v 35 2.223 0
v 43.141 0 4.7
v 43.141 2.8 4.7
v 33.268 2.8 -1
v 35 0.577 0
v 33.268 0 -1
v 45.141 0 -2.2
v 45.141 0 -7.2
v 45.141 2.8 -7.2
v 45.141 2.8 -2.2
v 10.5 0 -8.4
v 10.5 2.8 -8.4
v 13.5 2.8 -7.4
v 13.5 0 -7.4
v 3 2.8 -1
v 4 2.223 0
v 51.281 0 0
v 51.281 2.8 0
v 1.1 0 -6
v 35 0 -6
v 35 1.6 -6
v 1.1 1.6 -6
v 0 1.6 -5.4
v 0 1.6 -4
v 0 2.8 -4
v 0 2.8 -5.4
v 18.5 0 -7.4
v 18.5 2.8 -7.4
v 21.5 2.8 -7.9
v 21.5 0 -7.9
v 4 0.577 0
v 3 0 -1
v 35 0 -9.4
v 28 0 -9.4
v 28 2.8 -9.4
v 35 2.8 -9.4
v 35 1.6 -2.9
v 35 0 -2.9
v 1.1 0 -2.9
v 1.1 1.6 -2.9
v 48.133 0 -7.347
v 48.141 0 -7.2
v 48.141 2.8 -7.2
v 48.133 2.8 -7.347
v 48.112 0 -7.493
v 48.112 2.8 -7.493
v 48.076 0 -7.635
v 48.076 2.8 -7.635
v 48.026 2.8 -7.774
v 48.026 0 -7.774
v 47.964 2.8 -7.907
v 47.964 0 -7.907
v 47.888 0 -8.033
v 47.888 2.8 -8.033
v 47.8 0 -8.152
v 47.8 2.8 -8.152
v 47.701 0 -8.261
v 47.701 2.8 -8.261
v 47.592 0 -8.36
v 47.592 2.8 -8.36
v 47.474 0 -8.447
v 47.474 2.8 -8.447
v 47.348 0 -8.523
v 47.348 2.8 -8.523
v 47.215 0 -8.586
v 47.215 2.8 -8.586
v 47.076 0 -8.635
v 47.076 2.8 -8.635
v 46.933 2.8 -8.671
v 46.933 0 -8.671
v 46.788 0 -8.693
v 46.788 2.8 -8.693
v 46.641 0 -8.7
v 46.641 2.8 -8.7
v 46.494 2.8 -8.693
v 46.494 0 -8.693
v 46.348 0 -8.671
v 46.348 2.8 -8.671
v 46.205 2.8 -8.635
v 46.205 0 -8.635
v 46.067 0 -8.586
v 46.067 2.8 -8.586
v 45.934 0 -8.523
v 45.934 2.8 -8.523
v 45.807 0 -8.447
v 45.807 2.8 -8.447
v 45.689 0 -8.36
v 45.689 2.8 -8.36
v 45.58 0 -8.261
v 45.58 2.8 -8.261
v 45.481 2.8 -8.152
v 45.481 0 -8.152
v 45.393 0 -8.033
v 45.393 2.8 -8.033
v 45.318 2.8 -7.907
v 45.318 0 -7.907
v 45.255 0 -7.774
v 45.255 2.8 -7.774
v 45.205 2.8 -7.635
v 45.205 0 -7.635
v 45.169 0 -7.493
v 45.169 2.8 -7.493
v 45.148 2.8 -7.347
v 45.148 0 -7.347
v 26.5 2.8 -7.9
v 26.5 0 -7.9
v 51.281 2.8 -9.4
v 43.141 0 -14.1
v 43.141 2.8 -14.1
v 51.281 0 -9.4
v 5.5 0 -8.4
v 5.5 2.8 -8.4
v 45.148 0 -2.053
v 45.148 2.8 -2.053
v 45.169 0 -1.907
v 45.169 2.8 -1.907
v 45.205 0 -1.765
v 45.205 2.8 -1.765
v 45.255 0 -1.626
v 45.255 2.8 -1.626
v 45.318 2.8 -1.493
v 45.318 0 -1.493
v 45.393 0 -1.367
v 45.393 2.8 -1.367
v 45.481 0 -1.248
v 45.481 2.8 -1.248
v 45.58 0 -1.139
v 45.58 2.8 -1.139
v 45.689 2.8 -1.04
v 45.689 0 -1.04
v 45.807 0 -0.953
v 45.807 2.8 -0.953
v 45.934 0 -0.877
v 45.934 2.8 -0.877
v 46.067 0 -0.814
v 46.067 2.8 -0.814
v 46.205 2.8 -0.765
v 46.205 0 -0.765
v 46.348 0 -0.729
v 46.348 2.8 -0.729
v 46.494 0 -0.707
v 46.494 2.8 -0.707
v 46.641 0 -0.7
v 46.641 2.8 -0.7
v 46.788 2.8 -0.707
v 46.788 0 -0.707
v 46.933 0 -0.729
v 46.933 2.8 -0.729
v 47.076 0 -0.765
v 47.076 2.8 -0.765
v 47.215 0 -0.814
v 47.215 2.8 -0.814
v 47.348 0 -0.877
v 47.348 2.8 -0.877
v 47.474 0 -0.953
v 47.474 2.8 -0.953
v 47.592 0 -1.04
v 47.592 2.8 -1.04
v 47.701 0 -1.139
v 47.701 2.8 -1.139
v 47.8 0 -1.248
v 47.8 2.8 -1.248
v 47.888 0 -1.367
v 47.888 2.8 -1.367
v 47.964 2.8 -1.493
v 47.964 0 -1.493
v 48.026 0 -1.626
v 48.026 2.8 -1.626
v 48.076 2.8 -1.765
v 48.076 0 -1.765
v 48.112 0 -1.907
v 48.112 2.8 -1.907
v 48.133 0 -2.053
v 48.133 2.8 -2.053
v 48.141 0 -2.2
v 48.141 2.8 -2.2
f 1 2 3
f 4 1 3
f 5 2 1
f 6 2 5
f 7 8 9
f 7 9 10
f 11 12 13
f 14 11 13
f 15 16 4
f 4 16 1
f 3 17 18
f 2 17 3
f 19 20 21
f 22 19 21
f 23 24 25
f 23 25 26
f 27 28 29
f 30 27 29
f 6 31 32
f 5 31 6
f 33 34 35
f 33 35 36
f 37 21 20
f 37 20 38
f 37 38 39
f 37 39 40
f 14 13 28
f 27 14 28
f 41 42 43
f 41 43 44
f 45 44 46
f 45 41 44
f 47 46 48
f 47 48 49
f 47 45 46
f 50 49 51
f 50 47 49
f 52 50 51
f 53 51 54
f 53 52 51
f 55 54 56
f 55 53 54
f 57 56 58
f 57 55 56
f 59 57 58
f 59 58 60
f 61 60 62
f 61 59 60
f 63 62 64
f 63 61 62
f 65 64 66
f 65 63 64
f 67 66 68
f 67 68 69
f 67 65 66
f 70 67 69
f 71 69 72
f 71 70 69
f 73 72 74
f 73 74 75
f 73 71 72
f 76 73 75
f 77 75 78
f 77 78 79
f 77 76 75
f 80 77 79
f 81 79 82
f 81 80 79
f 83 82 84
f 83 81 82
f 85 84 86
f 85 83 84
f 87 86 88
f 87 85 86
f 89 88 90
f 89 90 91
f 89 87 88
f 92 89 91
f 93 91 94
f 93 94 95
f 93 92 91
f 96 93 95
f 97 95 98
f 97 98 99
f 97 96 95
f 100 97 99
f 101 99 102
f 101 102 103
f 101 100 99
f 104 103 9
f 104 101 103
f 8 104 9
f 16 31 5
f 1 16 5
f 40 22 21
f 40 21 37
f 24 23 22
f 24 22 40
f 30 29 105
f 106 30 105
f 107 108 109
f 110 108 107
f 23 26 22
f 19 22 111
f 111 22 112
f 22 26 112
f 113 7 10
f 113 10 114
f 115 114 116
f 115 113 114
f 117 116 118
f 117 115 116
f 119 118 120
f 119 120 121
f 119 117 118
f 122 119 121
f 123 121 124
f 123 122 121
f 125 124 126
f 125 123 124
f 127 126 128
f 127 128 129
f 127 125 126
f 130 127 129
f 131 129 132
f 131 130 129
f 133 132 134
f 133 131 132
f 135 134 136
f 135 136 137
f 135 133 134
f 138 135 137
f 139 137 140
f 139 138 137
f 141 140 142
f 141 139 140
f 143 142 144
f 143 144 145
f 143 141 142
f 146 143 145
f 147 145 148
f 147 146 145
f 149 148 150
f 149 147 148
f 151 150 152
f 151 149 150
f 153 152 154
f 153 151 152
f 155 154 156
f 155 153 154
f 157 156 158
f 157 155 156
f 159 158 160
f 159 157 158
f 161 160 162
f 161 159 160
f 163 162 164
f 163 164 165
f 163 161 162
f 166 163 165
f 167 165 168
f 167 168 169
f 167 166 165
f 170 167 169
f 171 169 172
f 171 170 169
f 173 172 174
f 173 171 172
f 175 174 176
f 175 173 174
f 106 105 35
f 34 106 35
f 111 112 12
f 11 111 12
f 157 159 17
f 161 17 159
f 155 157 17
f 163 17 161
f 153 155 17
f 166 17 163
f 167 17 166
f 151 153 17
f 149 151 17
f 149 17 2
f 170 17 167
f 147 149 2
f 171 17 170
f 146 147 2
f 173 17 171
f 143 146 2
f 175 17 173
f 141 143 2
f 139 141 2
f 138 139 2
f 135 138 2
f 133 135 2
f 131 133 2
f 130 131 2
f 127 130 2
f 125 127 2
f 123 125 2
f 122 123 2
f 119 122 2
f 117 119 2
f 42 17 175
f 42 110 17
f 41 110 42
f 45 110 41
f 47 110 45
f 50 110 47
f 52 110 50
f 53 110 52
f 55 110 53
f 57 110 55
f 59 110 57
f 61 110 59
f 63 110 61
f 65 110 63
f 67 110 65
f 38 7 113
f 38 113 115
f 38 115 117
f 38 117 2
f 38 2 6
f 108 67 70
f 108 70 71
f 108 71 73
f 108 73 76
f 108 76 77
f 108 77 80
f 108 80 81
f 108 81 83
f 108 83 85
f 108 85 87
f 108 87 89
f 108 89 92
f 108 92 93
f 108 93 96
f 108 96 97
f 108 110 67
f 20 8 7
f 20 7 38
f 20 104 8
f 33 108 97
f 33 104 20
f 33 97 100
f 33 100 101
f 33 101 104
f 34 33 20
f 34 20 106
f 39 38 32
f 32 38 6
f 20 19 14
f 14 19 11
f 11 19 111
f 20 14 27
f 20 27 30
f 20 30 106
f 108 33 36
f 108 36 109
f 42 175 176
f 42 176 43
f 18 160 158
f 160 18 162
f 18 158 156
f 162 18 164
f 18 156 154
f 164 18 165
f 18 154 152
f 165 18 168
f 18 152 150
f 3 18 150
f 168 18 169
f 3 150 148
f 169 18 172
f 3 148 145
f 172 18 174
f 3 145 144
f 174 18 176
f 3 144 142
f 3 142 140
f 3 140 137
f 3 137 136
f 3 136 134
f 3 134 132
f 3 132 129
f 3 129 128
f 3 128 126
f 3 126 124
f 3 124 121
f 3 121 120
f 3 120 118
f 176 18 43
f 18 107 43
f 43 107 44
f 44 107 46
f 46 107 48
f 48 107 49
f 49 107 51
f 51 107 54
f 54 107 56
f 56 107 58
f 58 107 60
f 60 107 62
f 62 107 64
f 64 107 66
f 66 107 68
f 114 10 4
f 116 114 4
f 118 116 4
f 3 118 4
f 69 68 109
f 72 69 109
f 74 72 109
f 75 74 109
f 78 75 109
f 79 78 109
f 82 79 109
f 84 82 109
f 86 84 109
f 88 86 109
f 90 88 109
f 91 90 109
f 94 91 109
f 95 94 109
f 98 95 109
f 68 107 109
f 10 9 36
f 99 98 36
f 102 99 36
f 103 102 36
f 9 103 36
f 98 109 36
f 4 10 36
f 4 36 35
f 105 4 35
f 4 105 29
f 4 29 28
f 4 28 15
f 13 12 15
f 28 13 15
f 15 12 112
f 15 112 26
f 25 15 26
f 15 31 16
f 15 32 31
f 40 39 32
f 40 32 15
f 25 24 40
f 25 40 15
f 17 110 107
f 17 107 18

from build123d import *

# Parameters (mm, degrees)
SKETCH1_W           = 35
SKETCH1_H           = 9.4
BOSS_EXTRUDE1_DEPTH = 2.8
SKETCH2_W           = 3.1
SKETCH2_H           = 1.6
CUT_EXTRUDE1_DEPTH  = 35
CHAMFER2_SIZE       = 4
CHAMFER5_SIZE       = 1
CHAMFER5_SIZE2      = 0.577350269
CHAMFER6_SIZE       = 1
CHAMFER6_SIZE2      = 0.577350269
CUT_EXTRUDE2_DEPTH  = 10


with BuildPart() as part:
    # Sketch1 → Boss-Extrude1 (new body)
    # profile 1 of 2: a face of its own
    with BuildSketch(Plane(origin=(0, 0, 0), x_dir=(1, 0, 0), z_dir=(0, 1, 0))):
        with Locations((17.5, 4.7)):
            Rectangle(SKETCH1_W, SKETCH1_H)
    # profile 2 of 2: a face of its own
    with BuildSketch(Plane(origin=(0, 0, 0), x_dir=(1, 0, 0), z_dir=(0, 1, 0))):
        Polygon((35, 0), (35, 9.4), (43.140638796, 14.1), (51.281277591, 9.4), (51.281277591, 0), (43.140638796, -4.7), align=None)
        with BuildLine():
            ThreePointArc((45.140638796, 2.2), (46.640638796, 0.7), (48.140638796, 2.2))
            Line((48.140638796, 2.2), (48.140638796, 7.2))
            ThreePointArc((48.140638796, 7.2), (46.640638796, 8.7), (45.140638796, 7.2))
            Line((45.140638796, 7.2), (45.140638796, 2.2))
        make_face(mode=Mode.SUBTRACT)
    extrude(amount=BOSS_EXTRUDE1_DEPTH)

    # Sketch2 → Cut-Extrude1 (cut)
    with BuildSketch(Plane.ZY):
        with Locations((-4.45, 0.8)):
            Rectangle(SKETCH2_W, SKETCH2_H)
    extrude(amount=-CUT_EXTRUDE1_DEPTH, mode=Mode.SUBTRACT)

    # Chamfer2
    chamfer2_edges = [part.edges().sort_by_distance(p)[0] for p in [
        (0, 1.4, 0),
    ]]
    chamfer(chamfer2_edges, length=CHAMFER2_SIZE)

    # Chamfer5
    chamfer5_edges = [part.edges().sort_by_distance(p)[0] for p in [
        (19.5, 0, 0),
    ]]
    chamfer5_side = [part.faces().sort_by_distance(p)[0] for p in [
        (18.05, 0, -2.353812355),
    ]]
    chamfer(chamfer5_edges, length=CHAMFER5_SIZE, length2=CHAMFER5_SIZE2, reference=chamfer5_side[0])

    # Chamfer6
    chamfer6_edges = [part.edges().sort_by_distance(p)[0] for p in [
        (19.5, 2.8, 0),
    ]]
    chamfer6_side = [part.faces().sort_by_distance(p)[0] for p in [
        (27.665536573, 2.8, -4.750962089),
    ]]
    chamfer(chamfer6_edges, length=CHAMFER6_SIZE, length2=CHAMFER6_SIZE2, reference=chamfer6_side[0])

    # Sketch3 → Cut-Extrude2 (cut)
    with BuildSketch(Plane(origin=(0, 2.8, 0), x_dir=(1, 0, 0), z_dir=(0, 1, 0))):
        Polygon((8, 8.4), (10.5, 8.4), (13.5, 7.4), (16, 7.4), (18.5, 7.4), (21.5, 7.9), (24, 7.9), (26.5, 7.9), (28, 9.4), (4, 9.4), (0, 9.4), (0, 5.4), (5.5, 8.4), align=None)
    extrude(amount=-CUT_EXTRUDE2_DEPTH, mode=Mode.SUBTRACT)


solid = part.part
